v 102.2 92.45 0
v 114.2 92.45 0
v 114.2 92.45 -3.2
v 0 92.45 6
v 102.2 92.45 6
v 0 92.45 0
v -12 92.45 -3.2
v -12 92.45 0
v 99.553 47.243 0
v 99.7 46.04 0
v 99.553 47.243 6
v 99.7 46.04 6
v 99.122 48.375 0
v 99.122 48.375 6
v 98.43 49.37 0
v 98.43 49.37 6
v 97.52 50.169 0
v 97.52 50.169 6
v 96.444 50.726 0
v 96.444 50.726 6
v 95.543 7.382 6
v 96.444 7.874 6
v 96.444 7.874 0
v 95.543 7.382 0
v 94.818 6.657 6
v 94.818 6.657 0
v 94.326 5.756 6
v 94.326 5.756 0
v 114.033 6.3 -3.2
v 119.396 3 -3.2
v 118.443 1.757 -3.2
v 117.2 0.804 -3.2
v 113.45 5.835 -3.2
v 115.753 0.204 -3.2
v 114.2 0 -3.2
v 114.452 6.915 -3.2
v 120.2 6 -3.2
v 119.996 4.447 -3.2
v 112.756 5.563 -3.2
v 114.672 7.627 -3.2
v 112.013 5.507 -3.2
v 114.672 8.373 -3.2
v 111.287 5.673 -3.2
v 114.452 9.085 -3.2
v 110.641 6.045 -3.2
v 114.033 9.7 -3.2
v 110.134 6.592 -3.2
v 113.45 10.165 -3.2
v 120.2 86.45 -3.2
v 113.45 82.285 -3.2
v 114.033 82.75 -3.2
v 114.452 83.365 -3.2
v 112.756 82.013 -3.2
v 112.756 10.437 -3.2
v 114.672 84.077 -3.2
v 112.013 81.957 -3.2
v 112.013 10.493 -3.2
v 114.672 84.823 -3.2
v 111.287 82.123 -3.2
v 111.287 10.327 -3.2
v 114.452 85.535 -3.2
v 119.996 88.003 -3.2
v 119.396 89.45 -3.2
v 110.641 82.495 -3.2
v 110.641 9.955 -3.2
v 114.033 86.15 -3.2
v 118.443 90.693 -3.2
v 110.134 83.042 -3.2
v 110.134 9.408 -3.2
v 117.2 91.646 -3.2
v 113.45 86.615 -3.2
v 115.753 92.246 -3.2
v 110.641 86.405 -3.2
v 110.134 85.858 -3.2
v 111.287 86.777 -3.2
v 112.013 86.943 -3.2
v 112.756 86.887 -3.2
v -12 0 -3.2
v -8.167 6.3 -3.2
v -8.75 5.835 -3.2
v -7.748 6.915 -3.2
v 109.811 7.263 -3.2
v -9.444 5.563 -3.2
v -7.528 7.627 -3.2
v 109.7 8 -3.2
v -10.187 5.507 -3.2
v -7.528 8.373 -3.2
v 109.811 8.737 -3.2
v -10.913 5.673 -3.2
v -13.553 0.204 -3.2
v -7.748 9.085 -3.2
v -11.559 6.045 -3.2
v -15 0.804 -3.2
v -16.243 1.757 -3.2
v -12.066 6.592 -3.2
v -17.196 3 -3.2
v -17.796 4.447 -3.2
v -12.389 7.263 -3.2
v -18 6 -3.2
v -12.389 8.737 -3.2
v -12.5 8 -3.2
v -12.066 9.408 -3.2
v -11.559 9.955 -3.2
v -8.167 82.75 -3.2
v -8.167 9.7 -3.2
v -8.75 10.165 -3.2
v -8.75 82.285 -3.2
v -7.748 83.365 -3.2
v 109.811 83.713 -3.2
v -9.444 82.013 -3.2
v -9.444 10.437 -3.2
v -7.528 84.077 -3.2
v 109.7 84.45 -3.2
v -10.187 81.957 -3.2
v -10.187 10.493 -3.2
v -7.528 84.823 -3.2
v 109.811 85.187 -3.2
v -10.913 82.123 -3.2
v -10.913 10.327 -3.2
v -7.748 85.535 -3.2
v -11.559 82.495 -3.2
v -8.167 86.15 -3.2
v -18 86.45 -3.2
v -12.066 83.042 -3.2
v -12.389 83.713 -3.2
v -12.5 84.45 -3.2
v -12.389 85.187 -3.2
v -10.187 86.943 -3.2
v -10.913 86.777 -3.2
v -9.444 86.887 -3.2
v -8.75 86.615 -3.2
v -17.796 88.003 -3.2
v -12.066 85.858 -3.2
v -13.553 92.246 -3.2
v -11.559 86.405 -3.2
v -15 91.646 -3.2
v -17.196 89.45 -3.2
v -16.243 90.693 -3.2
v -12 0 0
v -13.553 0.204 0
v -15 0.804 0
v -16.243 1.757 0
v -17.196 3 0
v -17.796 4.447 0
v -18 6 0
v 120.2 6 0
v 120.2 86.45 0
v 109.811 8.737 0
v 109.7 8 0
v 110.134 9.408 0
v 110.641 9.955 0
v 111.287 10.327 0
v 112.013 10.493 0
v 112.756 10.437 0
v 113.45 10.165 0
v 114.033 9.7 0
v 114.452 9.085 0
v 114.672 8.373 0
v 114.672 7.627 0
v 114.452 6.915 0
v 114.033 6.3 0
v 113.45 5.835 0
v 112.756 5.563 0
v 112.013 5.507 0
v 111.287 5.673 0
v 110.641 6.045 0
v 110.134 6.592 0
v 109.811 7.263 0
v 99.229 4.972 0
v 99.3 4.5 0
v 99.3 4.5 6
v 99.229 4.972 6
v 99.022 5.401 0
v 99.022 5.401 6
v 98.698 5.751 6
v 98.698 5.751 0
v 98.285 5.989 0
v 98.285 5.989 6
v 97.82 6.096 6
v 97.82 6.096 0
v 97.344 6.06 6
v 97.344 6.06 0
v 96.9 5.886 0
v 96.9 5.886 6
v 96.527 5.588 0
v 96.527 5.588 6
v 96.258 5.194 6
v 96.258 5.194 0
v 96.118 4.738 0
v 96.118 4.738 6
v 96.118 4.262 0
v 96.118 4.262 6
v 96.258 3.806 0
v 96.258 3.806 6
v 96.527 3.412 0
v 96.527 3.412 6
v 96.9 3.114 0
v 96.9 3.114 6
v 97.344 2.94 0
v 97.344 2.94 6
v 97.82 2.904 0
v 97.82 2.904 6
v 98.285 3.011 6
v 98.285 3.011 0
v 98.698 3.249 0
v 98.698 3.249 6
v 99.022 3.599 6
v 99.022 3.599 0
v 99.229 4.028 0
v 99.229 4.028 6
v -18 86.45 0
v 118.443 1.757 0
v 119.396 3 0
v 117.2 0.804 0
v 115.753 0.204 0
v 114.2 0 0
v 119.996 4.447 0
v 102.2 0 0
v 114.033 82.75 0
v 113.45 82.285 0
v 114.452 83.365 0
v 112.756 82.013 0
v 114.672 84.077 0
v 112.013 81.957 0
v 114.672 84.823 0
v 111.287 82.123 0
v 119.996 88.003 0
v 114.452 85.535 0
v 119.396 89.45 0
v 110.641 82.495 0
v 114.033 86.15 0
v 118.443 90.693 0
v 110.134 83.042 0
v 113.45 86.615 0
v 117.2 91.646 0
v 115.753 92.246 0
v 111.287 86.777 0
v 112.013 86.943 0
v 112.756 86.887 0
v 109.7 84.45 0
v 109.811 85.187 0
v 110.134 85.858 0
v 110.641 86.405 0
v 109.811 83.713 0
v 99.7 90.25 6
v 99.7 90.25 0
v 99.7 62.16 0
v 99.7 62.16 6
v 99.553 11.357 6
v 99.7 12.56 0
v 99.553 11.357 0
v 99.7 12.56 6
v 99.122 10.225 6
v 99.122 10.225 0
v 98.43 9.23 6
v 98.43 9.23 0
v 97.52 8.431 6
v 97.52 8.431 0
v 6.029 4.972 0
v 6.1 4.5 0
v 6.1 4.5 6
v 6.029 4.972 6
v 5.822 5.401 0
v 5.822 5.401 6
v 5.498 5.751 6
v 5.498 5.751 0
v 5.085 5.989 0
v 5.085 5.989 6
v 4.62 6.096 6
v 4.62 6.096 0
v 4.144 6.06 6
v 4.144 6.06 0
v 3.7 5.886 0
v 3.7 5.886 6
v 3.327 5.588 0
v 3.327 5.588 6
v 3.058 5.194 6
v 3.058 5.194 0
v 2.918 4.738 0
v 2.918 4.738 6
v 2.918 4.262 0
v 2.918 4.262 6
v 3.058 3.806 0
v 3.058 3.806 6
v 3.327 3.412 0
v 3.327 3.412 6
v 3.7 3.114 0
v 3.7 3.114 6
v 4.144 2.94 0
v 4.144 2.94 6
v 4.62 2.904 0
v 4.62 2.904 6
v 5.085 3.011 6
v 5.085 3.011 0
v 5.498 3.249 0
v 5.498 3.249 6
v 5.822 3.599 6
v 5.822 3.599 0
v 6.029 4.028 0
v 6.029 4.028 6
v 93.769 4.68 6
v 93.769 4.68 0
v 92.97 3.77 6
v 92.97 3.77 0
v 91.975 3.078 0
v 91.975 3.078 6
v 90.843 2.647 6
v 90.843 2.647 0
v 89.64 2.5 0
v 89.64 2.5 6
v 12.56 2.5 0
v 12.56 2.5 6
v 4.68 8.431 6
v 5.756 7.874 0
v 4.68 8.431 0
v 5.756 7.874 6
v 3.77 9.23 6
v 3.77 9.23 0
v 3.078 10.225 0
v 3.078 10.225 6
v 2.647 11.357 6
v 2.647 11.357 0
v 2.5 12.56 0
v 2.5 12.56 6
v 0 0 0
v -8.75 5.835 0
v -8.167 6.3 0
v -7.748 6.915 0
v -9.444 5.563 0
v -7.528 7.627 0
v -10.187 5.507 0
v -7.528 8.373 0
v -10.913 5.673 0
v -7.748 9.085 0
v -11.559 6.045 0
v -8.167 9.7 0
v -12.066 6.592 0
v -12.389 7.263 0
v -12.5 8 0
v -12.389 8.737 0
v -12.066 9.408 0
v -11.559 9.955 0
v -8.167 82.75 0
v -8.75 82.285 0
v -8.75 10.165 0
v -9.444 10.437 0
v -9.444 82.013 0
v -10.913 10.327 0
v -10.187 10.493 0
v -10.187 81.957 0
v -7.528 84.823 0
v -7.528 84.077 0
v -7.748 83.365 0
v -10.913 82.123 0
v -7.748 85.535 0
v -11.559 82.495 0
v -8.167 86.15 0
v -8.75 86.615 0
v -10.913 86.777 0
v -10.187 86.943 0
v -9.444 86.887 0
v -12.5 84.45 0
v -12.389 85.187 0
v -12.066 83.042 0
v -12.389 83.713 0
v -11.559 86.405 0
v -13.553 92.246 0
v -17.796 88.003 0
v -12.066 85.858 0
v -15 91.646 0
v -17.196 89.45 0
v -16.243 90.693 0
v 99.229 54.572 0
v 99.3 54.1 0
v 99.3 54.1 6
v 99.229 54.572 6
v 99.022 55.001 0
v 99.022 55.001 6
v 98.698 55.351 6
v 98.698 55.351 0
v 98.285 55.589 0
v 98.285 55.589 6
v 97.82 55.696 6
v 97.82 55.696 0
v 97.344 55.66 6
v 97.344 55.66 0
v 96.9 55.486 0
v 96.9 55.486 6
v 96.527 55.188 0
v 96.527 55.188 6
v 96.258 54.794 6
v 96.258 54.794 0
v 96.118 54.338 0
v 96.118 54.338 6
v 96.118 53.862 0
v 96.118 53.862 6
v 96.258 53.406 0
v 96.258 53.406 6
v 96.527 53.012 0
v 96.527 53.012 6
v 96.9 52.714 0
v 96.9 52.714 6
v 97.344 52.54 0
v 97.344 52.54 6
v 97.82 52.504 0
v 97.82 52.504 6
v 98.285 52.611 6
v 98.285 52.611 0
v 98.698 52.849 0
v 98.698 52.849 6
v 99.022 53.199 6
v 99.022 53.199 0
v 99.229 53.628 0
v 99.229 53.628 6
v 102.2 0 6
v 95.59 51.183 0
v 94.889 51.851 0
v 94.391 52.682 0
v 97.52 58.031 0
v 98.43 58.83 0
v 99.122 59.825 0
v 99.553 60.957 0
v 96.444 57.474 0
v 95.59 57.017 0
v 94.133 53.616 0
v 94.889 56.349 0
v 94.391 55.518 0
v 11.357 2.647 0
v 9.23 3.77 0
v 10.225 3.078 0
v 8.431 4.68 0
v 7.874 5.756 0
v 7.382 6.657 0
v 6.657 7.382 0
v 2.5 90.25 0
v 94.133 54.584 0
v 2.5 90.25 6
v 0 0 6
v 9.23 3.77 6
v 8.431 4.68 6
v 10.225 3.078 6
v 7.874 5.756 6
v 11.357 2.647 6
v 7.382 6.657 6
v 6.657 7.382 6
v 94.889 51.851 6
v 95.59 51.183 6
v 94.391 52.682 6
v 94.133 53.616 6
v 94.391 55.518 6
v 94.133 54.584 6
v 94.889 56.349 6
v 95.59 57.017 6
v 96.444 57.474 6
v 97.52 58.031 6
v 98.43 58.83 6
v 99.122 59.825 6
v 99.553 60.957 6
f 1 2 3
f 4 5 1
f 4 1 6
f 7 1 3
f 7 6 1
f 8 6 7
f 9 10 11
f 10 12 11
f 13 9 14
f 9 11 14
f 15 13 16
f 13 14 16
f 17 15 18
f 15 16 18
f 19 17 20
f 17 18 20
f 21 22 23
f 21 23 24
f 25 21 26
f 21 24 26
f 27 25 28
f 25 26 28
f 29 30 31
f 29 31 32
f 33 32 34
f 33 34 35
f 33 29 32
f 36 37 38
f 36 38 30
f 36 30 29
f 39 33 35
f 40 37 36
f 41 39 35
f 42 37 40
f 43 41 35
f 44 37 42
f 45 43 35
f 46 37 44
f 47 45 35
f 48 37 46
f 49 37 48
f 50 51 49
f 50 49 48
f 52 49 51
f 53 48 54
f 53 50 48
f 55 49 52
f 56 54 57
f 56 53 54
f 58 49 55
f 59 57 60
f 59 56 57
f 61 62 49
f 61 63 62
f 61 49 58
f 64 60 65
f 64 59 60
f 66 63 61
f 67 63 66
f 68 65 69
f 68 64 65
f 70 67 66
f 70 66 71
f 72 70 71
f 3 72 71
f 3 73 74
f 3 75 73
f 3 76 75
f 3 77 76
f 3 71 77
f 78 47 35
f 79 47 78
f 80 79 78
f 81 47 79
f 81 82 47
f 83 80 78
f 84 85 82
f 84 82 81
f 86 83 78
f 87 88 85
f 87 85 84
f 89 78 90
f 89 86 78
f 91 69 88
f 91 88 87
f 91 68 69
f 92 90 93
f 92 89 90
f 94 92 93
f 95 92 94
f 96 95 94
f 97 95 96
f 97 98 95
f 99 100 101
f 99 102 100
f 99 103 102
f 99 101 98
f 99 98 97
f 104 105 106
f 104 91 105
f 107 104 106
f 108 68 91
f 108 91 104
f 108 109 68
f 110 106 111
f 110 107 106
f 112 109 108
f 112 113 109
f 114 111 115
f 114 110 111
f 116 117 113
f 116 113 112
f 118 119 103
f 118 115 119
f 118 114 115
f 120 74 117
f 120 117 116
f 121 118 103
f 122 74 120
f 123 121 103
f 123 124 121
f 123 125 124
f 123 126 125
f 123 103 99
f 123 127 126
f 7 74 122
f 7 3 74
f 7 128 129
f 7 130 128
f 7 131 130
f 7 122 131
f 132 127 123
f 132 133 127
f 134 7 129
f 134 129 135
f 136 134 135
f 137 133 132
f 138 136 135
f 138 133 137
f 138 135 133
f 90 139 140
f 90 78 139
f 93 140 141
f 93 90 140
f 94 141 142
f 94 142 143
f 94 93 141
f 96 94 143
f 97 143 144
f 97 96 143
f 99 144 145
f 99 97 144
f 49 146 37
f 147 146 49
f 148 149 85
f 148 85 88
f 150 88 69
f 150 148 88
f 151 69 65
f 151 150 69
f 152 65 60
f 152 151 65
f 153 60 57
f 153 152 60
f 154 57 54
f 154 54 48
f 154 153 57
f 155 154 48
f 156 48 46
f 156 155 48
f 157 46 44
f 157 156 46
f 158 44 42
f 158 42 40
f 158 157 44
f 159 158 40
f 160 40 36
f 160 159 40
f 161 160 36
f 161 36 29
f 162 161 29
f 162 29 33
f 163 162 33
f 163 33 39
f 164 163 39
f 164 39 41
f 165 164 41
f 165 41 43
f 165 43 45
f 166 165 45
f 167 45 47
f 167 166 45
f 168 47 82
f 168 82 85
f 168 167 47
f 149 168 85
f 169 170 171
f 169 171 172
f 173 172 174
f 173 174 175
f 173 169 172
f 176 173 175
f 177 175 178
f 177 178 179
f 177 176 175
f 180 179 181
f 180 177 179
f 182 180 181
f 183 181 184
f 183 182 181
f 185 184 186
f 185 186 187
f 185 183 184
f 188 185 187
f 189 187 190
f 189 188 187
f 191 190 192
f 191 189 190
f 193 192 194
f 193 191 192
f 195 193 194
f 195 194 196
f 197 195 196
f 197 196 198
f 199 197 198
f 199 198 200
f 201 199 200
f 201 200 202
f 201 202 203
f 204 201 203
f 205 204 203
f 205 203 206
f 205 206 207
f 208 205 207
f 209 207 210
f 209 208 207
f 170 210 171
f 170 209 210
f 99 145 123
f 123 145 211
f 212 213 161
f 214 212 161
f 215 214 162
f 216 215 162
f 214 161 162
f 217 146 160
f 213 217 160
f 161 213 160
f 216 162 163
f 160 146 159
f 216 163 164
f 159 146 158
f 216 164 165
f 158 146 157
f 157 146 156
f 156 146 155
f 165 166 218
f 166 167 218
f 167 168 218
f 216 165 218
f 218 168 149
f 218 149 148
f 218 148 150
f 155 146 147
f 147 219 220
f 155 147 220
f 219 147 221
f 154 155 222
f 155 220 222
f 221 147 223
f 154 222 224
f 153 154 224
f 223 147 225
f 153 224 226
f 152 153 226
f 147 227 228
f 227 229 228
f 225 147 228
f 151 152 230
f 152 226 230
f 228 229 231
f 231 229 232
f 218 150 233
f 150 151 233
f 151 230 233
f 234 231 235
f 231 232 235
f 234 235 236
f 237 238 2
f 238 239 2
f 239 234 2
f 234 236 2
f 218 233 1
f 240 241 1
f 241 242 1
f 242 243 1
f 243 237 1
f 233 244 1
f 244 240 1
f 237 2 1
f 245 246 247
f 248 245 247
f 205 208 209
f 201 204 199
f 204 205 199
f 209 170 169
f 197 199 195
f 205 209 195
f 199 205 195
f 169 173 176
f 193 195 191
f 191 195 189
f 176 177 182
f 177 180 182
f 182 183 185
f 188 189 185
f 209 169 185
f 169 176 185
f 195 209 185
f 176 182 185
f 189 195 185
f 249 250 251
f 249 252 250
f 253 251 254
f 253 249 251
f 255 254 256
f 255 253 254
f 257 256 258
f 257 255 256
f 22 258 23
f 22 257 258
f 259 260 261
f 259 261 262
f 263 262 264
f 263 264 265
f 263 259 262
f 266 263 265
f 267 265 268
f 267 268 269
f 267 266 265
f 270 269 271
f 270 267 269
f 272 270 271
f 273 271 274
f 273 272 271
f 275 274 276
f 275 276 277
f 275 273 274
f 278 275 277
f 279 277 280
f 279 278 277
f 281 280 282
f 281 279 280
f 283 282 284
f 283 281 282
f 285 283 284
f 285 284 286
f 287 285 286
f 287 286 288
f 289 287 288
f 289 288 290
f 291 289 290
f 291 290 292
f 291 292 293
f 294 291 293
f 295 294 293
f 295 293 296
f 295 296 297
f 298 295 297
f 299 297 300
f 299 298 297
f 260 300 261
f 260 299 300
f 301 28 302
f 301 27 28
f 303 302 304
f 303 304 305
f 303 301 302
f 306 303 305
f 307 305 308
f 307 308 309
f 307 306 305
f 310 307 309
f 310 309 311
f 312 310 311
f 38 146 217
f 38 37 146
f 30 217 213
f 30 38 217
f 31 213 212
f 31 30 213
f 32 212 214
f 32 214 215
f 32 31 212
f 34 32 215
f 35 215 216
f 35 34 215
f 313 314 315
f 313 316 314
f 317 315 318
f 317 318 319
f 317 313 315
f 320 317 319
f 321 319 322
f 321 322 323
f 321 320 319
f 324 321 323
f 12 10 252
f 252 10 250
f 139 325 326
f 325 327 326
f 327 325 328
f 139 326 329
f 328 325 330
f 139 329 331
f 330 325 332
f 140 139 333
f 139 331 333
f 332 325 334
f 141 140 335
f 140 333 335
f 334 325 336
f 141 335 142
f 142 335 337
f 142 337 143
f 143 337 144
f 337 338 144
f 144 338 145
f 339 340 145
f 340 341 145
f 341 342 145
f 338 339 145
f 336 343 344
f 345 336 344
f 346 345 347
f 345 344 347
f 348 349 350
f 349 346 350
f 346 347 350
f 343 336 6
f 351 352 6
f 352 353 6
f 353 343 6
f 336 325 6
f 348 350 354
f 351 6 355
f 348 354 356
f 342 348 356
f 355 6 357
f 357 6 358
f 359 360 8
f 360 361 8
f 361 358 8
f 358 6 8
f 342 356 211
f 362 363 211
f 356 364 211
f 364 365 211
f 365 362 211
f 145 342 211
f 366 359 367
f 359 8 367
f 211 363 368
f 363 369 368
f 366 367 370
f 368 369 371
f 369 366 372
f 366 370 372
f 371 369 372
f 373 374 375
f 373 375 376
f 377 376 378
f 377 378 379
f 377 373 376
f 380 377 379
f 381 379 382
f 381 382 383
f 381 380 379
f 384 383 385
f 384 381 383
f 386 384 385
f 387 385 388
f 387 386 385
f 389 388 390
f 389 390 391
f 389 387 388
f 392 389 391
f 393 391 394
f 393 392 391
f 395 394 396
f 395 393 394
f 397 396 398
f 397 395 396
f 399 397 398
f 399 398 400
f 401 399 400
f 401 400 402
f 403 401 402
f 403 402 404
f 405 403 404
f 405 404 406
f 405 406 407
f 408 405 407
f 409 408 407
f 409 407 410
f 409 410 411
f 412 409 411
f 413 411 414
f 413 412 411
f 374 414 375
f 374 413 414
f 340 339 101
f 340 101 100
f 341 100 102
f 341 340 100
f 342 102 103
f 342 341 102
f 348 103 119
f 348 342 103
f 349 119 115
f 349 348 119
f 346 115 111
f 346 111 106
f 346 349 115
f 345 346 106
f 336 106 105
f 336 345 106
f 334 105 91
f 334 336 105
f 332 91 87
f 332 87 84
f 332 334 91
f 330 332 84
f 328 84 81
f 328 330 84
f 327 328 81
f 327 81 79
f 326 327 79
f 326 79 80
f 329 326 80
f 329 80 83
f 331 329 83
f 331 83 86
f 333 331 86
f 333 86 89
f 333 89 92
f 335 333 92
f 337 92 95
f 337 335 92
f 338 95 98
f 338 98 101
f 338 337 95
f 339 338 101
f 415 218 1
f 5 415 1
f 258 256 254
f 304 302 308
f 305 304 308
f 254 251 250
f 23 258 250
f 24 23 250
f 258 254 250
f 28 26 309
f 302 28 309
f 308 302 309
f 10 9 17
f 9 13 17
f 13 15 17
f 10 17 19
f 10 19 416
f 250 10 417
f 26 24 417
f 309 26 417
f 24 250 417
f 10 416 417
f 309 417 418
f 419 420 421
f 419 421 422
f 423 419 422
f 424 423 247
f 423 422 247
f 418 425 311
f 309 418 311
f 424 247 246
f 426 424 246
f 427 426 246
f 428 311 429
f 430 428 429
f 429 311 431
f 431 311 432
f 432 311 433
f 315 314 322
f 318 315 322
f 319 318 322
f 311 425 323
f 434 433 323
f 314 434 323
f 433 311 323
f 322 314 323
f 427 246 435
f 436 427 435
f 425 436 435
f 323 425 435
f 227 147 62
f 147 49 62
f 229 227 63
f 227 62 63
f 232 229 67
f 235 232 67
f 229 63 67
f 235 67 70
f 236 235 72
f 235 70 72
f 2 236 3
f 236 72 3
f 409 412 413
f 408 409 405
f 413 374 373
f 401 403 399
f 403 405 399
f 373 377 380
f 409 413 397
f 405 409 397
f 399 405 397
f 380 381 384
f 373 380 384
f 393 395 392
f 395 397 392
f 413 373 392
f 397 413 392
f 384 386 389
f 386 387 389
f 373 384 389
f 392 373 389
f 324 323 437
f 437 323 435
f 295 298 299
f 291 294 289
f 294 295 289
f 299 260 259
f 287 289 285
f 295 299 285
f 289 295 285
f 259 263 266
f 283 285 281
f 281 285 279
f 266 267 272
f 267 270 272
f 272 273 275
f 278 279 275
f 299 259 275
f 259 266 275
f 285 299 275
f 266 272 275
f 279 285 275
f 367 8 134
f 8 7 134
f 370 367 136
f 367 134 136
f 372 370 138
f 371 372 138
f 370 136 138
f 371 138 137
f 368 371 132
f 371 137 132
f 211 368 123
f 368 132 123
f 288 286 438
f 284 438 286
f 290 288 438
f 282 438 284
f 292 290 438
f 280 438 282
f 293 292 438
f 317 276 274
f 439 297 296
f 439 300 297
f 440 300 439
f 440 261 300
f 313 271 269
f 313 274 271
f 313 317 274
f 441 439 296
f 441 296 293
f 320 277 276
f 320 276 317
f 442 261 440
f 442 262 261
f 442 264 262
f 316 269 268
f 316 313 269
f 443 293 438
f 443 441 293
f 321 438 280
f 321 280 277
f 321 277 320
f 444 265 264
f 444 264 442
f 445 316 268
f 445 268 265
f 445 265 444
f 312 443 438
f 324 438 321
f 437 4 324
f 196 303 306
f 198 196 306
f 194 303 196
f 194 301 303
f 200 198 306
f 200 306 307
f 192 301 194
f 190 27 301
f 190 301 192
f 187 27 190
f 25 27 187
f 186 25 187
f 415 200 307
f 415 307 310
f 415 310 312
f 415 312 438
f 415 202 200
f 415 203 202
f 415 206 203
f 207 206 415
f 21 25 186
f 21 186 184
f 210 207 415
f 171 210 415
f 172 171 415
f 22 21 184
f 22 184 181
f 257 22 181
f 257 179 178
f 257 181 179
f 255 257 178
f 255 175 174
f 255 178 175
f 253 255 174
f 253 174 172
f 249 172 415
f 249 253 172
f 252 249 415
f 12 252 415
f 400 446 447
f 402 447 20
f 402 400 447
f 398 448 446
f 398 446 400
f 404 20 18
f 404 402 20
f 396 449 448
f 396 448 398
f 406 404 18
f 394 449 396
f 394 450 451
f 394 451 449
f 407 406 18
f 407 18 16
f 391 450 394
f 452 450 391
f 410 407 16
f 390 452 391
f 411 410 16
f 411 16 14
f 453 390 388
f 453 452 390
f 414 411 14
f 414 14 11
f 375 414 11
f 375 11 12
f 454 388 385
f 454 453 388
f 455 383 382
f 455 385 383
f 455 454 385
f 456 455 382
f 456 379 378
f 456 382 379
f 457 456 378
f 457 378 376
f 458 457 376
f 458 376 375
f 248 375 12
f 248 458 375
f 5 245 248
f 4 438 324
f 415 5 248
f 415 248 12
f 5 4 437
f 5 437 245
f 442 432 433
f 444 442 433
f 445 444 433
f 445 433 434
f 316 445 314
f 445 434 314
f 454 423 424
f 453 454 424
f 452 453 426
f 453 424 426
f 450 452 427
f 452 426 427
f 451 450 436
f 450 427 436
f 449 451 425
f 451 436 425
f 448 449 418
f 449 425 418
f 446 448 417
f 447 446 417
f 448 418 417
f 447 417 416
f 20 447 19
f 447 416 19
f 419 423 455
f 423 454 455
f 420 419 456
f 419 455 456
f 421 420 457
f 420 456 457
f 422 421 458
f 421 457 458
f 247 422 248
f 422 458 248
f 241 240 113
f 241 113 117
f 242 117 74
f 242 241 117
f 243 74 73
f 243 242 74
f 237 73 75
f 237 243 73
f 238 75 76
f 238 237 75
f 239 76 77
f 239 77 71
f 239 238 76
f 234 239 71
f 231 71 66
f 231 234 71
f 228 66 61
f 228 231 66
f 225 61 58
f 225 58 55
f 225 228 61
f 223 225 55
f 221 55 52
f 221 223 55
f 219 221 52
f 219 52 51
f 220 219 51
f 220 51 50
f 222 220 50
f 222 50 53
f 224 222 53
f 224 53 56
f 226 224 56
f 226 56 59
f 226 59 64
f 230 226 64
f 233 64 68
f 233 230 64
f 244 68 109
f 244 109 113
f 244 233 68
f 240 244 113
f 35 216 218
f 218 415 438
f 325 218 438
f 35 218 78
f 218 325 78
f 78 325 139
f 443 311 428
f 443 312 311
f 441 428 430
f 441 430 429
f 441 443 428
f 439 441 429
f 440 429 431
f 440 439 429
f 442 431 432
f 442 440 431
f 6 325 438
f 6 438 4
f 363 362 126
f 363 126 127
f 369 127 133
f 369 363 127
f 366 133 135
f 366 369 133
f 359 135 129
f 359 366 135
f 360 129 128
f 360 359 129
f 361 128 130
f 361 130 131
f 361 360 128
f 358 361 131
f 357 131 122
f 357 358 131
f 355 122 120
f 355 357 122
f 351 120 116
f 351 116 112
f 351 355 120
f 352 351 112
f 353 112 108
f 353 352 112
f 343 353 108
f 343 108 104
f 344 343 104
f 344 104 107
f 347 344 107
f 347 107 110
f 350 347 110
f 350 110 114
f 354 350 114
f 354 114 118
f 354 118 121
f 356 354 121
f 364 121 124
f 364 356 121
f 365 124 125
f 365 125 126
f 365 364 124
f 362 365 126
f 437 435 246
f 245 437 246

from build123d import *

# Parameters (mm, degrees)
SKETCH1_W           = 102.2
SKETCH1_H           = 92.45
SKETCH1_R           = 1.6
BOSS_EXTRUDE1_DEPTH = 6
SKETCH2_W           = 138.2
SKETCH2_H           = 92.45
SKETCH2_R           = 2.5
BOSS_EXTRUDE2_DEPTH = 3.2
FILLET1_R           = 6
FILLET2_R           = 5
FILLET3_R           = 5


with BuildPart() as part:
    # Sketch1 → Boss-Extrude1 (new body)
    with BuildSketch(Plane.XY):
        with Locations((51.1, 46.225)):
            Rectangle(SKETCH1_W, SKETCH1_H)
        with BuildLine():
            Line((94.706674091, 2.5), (7.493325909, 2.5))
            ThreePointArc((7.493325909, 2.5), (7.045584412, 7.045584412), (2.5, 7.493325909))
            Line((2.5, 7.493325909), (2.5, 90.25))
            Line((2.5, 90.25), (99.7, 90.25))
            Line((99.7, 90.25), (99.7, 57.093325909))
            ThreePointArc((99.7, 57.093325909), (94.1, 54.1), (99.7, 51.106674091))
            Line((99.7, 51.106674091), (99.7, 7.493325909))
            ThreePointArc((99.7, 7.493325909), (95.154415588, 7.045584412), (94.706674091, 2.5))
        make_face(mode=Mode.SUBTRACT)
        with Locations((4.5, 4.5)):
            Circle(SKETCH1_R, mode=Mode.SUBTRACT)
        with Locations((97.7, 4.5)):
            Circle(SKETCH1_R, mode=Mode.SUBTRACT)
        with Locations((97.7, 54.1)):
            Circle(SKETCH1_R, mode=Mode.SUBTRACT)
    extrude(amount=BOSS_EXTRUDE1_DEPTH)

    # Sketch2 → Boss-Extrude2 (add)
    with BuildSketch(Plane(origin=(0, 0, 0), x_dir=(-1, 0, 0), z_dir=(0, 0, -1))):
        with Locations((-51.1, 46.225)):
            Rectangle(SKETCH2_W, SKETCH2_H)
        with Locations((-112.2, 84.45)):
            Circle(SKETCH2_R, mode=Mode.SUBTRACT)
        with Locations((-112.2, 8)):
            Circle(SKETCH2_R, mode=Mode.SUBTRACT)
        with Locations((10, 8)):
            Circle(SKETCH2_R, mode=Mode.SUBTRACT)
        with Locations((10, 84.45)):
            Circle(SKETCH2_R, mode=Mode.SUBTRACT)
    extrude(amount=BOSS_EXTRUDE2_DEPTH)

    # Fillet1
    fillet1_edges = [part.edges().sort_by_distance(p)[0] for p in [
        (120.2, 92.45, -1.6),
        (120.2, 0, -1.6),
        (-18, 0, -1.6),
        (-18, 92.45, -1.6),
    ]]
    fillet(fillet1_edges, radius=FILLET1_R)

    # Fillet2
    fillet2_edges = [part.edges().sort_by_distance(p)[0] for p in [
        (99.7, 51.106674091, 3),
        (99.7, 57.093325909, 3),
    ]]
    fillet(fillet2_edges, radius=FILLET2_R)

    # Fillet3
    fillet3_edges = [part.edges().sort_by_distance(p)[0] for p in [
        (7.493325909, 2.5, 3),
        (94.706674091, 2.5, 3),
        (99.7, 7.493325909, 3),
        (2.5, 7.493325909, 3),
    ]]
    fillet(fillet3_edges, radius=FILLET3_R)


solid = part.part
